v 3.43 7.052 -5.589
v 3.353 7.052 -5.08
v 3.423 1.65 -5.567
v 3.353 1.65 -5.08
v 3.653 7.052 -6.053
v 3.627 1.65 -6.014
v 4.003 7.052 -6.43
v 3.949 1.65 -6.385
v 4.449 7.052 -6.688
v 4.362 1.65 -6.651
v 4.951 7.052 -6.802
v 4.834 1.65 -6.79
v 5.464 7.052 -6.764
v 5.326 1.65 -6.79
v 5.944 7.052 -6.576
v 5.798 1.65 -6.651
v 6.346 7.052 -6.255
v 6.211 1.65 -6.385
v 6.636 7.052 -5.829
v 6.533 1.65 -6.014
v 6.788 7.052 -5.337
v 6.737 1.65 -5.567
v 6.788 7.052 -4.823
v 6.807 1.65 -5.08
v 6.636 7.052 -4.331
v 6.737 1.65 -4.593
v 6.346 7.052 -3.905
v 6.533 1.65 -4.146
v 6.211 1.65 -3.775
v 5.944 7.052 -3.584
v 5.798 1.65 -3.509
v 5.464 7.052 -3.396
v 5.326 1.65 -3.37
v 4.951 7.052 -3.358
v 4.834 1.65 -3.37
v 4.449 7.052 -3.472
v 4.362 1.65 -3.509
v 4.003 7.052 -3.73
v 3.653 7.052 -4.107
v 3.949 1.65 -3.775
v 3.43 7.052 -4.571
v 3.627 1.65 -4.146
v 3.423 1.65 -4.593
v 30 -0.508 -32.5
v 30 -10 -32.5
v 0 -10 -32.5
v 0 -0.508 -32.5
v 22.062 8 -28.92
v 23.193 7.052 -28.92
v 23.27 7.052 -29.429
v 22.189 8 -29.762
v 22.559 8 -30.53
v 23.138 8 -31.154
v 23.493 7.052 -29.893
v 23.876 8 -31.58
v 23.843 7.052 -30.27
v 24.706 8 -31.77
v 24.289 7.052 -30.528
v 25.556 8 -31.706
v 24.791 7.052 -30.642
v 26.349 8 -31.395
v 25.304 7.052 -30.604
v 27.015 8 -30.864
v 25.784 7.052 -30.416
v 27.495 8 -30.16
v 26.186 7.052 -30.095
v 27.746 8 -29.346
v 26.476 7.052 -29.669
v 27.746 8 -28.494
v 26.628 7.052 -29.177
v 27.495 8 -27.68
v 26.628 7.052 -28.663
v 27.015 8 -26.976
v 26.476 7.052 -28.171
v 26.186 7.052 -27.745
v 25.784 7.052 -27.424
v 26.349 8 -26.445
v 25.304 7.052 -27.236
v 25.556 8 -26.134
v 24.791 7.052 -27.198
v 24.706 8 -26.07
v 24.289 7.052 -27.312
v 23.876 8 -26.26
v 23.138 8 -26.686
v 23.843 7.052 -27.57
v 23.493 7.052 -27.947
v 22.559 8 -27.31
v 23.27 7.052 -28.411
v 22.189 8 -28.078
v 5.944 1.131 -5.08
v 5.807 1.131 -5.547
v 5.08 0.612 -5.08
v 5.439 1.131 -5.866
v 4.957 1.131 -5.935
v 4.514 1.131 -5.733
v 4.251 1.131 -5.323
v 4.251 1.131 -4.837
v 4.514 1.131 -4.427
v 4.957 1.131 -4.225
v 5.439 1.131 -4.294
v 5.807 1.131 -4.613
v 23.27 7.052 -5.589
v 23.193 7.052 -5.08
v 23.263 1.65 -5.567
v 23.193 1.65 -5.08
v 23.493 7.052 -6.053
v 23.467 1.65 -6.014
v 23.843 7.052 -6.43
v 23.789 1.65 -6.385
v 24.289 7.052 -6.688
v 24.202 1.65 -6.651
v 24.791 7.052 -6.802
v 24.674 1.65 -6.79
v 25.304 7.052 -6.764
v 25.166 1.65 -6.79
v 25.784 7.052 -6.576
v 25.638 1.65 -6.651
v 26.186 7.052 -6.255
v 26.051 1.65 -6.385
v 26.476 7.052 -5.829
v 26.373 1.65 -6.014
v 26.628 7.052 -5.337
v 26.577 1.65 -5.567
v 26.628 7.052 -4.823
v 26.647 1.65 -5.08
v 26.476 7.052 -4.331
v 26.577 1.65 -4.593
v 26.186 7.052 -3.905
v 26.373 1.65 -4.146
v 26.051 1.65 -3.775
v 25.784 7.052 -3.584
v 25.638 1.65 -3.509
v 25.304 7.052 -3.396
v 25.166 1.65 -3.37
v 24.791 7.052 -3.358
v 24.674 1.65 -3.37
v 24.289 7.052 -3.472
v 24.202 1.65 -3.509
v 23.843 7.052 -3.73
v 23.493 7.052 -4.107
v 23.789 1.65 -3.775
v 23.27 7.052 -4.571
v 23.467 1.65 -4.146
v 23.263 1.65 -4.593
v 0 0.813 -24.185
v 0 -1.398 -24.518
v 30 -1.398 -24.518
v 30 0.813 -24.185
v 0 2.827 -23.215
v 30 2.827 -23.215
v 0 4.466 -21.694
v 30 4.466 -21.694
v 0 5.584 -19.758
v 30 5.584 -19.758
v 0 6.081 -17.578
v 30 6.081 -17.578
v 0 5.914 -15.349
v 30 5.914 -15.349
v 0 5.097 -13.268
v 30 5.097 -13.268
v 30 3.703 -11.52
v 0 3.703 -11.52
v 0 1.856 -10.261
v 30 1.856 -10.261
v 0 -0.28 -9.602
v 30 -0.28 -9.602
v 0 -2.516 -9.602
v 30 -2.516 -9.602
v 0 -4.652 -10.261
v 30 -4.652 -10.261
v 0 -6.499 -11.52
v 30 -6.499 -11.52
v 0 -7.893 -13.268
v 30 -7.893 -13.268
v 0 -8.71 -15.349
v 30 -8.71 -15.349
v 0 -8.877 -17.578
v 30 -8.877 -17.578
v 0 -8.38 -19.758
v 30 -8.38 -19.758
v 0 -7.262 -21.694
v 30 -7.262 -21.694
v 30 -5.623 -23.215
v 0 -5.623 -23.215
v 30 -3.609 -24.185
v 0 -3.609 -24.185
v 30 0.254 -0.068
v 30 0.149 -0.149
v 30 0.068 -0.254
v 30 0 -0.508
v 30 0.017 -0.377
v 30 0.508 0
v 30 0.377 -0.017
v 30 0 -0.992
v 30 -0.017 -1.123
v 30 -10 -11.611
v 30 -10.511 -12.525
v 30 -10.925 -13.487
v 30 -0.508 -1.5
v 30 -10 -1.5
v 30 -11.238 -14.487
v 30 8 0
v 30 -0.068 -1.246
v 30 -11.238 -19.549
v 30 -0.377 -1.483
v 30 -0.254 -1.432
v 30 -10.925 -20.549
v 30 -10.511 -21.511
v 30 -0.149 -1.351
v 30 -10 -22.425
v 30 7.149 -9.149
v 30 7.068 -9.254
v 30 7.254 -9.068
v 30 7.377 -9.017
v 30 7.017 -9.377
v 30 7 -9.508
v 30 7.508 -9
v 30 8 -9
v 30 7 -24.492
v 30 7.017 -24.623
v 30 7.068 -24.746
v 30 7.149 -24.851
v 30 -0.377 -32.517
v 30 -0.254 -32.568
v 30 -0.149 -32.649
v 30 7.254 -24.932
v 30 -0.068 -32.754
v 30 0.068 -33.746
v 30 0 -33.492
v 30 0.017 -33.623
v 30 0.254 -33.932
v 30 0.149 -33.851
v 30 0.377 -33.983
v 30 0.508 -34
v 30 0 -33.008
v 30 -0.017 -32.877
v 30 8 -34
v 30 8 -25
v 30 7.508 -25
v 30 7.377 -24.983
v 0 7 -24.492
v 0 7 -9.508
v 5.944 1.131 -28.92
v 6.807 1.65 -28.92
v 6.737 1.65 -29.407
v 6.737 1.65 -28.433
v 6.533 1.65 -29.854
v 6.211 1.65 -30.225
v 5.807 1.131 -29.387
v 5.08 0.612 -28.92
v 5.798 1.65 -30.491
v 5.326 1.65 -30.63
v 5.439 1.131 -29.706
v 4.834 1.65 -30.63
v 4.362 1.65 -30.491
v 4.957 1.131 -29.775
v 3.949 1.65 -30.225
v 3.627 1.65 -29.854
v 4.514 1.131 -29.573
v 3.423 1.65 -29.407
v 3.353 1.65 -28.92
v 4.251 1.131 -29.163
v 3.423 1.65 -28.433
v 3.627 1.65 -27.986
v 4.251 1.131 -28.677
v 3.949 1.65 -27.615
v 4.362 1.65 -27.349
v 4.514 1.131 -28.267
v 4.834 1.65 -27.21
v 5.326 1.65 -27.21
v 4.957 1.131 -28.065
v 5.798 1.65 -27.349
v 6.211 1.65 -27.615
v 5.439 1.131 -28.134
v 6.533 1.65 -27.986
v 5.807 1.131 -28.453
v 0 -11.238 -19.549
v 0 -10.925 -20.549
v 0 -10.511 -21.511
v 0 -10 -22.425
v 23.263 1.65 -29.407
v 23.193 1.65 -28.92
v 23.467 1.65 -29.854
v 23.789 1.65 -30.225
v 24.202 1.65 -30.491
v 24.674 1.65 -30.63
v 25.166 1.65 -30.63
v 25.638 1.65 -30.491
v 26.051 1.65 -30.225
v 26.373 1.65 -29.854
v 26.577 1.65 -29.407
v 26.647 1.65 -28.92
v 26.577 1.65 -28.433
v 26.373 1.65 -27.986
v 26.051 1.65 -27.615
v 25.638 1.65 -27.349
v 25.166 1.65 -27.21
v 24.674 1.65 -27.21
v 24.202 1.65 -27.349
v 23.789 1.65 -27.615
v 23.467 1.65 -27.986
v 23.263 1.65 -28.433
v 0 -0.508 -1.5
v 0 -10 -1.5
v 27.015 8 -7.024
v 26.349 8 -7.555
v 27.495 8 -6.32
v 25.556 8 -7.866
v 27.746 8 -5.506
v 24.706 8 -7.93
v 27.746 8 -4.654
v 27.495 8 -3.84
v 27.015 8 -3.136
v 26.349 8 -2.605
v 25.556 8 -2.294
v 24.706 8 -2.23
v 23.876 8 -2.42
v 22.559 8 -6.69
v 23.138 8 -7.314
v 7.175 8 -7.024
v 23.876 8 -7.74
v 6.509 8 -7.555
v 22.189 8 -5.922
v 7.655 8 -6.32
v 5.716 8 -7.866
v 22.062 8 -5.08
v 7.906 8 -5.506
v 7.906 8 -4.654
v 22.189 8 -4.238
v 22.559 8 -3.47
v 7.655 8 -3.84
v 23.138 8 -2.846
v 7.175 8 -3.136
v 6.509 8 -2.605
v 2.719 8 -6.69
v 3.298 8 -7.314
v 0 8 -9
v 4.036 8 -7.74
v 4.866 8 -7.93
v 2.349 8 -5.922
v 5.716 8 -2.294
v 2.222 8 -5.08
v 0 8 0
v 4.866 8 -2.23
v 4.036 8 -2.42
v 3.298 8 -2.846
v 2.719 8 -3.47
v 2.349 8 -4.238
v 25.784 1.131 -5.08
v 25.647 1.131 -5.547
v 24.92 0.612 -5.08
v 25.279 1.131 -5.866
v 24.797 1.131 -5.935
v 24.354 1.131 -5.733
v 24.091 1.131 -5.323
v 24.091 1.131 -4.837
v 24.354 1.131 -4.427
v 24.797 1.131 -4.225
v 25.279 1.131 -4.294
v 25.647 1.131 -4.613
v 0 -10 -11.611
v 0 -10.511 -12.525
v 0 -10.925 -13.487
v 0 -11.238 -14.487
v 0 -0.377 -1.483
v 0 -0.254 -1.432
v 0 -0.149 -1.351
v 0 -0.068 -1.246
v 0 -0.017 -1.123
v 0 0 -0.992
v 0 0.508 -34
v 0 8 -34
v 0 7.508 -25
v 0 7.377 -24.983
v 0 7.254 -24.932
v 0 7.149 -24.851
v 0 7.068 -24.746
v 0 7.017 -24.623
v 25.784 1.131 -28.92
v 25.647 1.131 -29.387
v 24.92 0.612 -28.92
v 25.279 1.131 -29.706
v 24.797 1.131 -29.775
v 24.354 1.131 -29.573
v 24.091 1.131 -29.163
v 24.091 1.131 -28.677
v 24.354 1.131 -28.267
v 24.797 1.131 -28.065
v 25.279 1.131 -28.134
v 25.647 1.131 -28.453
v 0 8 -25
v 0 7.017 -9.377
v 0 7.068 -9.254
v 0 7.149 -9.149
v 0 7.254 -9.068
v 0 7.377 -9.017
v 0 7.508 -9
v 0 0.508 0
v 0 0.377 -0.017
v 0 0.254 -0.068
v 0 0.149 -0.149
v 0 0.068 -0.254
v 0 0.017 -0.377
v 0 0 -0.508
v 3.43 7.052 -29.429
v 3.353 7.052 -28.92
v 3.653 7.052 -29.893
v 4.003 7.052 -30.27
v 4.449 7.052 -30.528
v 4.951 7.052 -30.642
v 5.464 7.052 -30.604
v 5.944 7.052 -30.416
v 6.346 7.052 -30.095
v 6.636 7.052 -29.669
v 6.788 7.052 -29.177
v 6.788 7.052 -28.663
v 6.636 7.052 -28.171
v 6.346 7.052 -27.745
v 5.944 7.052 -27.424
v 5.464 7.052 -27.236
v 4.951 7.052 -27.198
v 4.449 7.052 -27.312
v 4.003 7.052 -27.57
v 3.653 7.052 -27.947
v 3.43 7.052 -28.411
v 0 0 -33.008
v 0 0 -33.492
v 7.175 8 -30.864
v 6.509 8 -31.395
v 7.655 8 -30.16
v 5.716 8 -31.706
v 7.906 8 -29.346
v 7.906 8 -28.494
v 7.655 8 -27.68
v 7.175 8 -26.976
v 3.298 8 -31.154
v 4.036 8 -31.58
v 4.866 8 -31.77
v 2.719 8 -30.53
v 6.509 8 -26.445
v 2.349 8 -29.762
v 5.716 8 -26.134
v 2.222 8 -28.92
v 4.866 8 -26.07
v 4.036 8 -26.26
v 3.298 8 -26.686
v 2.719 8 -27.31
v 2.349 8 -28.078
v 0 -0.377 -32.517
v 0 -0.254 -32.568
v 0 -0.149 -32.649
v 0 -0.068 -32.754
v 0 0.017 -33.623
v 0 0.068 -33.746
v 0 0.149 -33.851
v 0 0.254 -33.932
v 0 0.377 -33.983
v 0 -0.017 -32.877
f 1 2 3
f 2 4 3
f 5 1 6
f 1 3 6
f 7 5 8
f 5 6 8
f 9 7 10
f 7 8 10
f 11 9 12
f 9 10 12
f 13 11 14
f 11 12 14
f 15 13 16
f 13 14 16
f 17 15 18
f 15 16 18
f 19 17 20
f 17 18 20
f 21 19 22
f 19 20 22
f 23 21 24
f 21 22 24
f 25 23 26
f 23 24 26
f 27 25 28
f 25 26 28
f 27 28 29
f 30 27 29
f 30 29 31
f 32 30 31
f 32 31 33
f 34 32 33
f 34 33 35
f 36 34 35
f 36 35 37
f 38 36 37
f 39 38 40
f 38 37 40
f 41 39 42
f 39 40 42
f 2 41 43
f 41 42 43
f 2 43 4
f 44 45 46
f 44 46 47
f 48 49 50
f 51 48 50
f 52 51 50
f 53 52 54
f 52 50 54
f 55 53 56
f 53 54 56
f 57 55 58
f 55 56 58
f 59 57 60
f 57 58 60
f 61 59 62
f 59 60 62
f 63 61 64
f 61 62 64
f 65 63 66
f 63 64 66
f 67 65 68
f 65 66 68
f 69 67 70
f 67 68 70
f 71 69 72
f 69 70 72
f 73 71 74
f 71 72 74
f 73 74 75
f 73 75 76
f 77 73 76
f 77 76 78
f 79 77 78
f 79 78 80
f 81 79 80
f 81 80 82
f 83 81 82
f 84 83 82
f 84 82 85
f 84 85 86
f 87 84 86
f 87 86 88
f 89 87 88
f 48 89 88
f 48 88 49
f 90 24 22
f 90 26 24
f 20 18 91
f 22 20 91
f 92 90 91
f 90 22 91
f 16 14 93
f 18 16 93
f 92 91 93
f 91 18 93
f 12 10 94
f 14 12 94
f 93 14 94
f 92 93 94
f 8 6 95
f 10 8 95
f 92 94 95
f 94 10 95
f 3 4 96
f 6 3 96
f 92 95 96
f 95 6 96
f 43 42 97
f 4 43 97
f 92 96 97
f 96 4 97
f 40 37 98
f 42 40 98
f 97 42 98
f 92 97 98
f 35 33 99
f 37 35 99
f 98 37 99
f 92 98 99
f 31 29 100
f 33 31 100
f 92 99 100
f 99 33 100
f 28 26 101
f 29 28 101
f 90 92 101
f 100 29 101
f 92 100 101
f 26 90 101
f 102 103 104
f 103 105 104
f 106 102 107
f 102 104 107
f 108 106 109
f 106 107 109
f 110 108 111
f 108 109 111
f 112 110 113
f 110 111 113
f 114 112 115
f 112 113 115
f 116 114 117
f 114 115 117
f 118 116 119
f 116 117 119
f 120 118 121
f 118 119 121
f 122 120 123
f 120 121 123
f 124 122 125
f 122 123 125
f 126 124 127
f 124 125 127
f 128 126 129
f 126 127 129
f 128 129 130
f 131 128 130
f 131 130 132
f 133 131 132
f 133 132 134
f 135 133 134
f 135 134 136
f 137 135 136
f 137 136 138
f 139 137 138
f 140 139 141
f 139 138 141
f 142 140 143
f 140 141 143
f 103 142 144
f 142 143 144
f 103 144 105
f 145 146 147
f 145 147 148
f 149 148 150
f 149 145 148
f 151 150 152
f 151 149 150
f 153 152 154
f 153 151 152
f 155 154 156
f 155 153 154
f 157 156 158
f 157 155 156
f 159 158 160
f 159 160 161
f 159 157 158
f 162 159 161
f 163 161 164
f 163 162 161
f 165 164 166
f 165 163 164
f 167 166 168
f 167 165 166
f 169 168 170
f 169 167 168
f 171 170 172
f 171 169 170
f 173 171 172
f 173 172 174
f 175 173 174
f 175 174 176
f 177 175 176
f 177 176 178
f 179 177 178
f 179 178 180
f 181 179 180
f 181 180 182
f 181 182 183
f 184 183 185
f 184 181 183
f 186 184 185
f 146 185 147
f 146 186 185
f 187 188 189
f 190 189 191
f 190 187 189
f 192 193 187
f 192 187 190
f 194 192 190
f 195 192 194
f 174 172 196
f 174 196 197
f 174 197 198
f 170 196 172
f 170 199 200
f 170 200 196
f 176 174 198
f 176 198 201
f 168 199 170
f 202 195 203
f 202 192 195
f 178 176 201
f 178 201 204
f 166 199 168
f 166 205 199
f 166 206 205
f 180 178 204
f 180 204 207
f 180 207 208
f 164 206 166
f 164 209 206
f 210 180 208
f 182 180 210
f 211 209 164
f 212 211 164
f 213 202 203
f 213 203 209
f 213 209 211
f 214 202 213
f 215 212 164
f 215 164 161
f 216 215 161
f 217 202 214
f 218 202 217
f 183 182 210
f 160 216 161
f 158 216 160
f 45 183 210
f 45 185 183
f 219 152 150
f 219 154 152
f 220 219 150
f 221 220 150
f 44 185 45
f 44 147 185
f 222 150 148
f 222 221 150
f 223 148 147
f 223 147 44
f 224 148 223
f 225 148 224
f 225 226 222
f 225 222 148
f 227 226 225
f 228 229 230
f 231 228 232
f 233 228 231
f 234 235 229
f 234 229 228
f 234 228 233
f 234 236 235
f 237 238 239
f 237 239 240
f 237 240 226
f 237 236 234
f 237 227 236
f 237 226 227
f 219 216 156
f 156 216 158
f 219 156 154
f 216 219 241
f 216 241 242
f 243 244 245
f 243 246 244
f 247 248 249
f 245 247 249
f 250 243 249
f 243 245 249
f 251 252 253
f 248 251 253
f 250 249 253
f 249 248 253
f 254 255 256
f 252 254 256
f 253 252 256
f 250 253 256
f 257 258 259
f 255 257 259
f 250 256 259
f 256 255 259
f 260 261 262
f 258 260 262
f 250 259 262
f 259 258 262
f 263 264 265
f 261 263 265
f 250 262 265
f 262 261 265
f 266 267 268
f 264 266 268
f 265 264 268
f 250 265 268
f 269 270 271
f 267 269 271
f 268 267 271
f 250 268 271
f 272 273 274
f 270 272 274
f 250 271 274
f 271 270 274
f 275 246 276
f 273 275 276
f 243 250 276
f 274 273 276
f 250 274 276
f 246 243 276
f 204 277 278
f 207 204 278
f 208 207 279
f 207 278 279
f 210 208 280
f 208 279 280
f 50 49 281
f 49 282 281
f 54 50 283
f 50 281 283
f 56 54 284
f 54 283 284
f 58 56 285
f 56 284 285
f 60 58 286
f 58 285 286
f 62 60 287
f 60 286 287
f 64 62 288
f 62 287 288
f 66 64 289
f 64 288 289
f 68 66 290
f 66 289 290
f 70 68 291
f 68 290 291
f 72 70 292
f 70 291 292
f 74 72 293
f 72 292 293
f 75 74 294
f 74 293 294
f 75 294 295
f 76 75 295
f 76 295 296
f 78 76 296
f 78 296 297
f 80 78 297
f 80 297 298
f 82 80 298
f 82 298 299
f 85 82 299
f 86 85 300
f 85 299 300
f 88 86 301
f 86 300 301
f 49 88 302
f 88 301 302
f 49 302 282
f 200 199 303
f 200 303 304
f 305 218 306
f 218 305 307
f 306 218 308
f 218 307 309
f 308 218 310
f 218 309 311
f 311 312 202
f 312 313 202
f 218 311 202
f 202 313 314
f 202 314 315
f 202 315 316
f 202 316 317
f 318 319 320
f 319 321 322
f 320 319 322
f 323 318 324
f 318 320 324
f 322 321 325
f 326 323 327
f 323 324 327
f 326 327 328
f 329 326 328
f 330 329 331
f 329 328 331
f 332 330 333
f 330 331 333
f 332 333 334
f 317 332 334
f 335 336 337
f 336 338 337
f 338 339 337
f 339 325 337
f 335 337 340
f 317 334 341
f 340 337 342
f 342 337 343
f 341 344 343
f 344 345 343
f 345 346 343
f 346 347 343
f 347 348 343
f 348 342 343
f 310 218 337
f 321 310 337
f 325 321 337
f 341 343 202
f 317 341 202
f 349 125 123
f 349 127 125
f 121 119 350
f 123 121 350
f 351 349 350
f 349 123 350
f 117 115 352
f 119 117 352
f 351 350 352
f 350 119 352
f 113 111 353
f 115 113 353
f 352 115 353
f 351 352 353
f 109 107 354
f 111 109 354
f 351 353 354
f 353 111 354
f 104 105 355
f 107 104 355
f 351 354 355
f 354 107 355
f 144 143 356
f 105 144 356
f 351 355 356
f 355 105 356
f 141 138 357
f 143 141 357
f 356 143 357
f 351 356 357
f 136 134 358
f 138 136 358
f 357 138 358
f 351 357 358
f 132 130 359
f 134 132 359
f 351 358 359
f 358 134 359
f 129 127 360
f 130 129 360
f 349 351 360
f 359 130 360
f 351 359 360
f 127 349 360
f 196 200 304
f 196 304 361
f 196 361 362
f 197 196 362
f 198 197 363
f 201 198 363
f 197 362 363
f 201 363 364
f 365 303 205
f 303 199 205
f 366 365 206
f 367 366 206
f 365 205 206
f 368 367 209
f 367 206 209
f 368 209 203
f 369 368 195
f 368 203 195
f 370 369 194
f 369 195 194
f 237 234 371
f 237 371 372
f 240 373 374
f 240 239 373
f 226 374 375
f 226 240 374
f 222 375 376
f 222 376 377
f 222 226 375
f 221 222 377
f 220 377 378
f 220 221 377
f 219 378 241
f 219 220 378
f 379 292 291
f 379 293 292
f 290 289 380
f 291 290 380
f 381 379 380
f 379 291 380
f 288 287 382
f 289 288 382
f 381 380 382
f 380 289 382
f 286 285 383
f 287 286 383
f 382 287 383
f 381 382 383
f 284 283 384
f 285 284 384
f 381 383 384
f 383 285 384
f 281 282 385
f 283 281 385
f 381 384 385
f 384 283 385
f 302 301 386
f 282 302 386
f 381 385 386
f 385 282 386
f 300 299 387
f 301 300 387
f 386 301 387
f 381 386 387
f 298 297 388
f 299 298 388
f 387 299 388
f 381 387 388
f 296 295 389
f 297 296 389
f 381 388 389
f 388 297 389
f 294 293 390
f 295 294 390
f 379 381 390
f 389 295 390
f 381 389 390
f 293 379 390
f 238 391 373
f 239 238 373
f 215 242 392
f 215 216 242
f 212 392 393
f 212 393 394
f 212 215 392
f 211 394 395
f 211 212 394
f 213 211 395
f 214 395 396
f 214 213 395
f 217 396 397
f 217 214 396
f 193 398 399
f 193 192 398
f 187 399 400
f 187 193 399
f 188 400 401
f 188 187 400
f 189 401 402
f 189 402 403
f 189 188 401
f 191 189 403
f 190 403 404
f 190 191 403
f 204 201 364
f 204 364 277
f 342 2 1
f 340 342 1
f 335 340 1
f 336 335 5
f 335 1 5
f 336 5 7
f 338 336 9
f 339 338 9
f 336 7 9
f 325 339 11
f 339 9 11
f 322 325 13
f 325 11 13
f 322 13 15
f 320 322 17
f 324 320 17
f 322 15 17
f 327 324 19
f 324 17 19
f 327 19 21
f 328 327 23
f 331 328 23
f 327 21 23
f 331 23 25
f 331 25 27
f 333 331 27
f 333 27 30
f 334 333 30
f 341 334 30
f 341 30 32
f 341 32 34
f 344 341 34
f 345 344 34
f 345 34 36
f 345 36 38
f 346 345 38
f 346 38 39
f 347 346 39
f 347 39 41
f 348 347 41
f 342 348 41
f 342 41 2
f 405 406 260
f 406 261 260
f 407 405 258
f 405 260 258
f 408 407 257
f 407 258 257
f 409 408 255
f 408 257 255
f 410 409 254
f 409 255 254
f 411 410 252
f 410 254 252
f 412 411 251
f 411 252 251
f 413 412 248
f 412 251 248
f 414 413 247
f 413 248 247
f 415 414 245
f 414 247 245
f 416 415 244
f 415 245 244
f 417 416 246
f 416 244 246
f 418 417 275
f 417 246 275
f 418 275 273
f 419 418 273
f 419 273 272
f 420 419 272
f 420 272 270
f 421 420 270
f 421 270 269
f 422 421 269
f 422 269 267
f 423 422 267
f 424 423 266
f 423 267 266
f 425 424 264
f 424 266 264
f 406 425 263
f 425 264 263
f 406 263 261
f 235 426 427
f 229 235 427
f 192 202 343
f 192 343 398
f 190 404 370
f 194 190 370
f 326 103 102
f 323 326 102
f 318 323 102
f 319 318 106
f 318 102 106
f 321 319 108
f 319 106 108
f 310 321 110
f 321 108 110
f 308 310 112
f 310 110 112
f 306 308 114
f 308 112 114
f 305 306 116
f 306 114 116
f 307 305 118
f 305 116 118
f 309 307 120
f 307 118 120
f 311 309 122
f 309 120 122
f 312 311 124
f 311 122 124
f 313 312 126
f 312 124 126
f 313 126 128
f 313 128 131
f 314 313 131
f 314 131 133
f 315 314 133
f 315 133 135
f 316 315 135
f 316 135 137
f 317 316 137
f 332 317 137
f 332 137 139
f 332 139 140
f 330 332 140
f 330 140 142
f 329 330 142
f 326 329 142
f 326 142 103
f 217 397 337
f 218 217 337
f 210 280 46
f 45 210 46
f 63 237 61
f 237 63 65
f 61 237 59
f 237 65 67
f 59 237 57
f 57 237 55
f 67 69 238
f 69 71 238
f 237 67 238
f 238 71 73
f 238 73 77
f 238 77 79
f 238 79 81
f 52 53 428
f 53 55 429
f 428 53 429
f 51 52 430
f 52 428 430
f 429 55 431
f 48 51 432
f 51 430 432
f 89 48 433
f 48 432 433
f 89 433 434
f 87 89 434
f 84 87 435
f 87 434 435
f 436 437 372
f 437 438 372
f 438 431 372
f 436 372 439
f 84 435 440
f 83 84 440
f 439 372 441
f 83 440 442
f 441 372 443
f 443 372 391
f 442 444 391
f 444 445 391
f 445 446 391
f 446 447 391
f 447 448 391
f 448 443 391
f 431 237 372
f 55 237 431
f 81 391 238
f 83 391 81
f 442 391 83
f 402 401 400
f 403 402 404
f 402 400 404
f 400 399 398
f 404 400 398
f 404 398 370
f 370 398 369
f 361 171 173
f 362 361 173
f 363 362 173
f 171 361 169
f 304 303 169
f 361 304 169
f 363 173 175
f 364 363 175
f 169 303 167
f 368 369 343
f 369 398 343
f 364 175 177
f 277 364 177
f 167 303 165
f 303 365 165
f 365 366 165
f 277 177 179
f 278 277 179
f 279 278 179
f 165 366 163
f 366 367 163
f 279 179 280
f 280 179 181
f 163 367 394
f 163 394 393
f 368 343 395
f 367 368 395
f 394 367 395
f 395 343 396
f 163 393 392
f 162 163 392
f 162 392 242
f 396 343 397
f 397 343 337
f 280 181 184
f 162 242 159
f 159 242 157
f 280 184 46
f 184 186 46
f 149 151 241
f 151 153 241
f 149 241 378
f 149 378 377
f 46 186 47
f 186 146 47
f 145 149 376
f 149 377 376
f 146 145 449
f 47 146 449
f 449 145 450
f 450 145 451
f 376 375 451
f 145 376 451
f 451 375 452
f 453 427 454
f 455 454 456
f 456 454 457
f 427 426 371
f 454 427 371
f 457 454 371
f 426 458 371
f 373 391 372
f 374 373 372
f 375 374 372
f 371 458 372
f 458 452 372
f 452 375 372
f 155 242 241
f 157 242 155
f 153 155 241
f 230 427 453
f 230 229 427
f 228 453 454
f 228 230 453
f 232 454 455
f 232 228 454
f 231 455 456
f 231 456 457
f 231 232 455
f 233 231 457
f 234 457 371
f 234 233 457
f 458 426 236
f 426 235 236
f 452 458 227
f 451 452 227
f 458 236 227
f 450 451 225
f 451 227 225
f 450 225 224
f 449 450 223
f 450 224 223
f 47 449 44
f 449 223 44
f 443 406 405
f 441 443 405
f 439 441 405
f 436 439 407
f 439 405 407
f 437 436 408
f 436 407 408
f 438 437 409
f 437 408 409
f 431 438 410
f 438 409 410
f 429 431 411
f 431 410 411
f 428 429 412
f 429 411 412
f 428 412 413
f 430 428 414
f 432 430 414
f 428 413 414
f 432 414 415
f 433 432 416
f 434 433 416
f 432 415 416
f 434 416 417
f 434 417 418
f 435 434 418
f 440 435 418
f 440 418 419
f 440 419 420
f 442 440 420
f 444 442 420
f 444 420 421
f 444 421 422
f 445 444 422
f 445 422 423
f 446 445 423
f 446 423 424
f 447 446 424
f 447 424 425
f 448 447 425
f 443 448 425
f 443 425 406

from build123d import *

# Parameters (mm, degrees)
SKETCH1_R                                         = 7.5
BOSS_EXTRUDE1_DEPTH                               = 30
CSK_FOR_4_FLAT_HEAD_MACHINE_SCREW_100_D           = 3.4544
CSK_FOR_4_FLAT_HEAD_MACHINE_SCREW_100_DEPTH       = 6.35
CSK_FOR_4_FLAT_HEAD_MACHINE_SCREW_100_CSINK_D     = 5.715
CSK_FOR_4_FLAT_HEAD_MACHINE_SCREW_100_CSINK_ANGLE = 100
CSK_FOR_4_FLAT_HEAD_MACHINE_SCREW_100_TIP         = 1.037806461
FILLET1_R                                         = 0.508


with BuildPart() as part:
    # Sketch1 → Boss-Extrude1 (new body)
    with BuildSketch(Plane(origin=(0, 0, 0), x_dir=(0, 0, -1), z_dir=(1, 0, 0))):
        with BuildLine():
            Line((32.5, 0), (34, 0))
            Line((34, 0), (34, 7.49375))
            Line((34, 7.49375), (34, 8))
            Line((34, 8), (25, 8))
            Line((25, 8), (25, 7))
            Line((25, 7), (9, 7))
            Line((9, 7), (9, 8))
            Line((9, 8), (0, 8))
            Line((0, 8), (0, 7.49375))
            Line((0, 7.49375), (0, 0))
            Line((0, 0), (1.5, 0))
            Line((1.5, 0), (1.5, -10))
            Line((1.5, -10), (11.611411797, -10))
            ThreePointArc((11.611411797, -10), (13.001010498, -10.730169916), (14.486500092, -11.237568497))
            Line((14.486500092, -11.237568497), (19.549499908, -11.237568497))
            ThreePointArc((19.549499908, -11.237568497), (21.034989502, -10.730169916), (22.424588203, -10))
            Line((22.424588203, -10), (32.5, -10))
            Line((32.5, -10), (32.5, 0))
        make_face()
        with Locations((17.018, -1.398)):
            Circle(SKETCH1_R, mode=Mode.SUBTRACT)
    extrude(amount=BOSS_EXTRUDE1_DEPTH)

    # CSK for #4 Flat Head Machine Screw (100)1
    with Locations(Plane(origin=(0, 8, 0), x_dir=(1, 0, 0), z_dir=(0, 1, 0))):
        with Locations((5.08, 28.92), (24.92, 28.92), (24.92, 5.08), (5.08, 5.08)):
            CounterSinkHole(CSK_FOR_4_FLAT_HEAD_MACHINE_SCREW_100_D / 2, CSK_FOR_4_FLAT_HEAD_MACHINE_SCREW_100_CSINK_D / 2, depth=CSK_FOR_4_FLAT_HEAD_MACHINE_SCREW_100_DEPTH, counter_sink_angle=CSK_FOR_4_FLAT_HEAD_MACHINE_SCREW_100_CSINK_ANGLE)
            with Locations((0, 0, -(CSK_FOR_4_FLAT_HEAD_MACHINE_SCREW_100_DEPTH + CSK_FOR_4_FLAT_HEAD_MACHINE_SCREW_100_TIP / 2))):  # 118° drill point
                Cone(0, CSK_FOR_4_FLAT_HEAD_MACHINE_SCREW_100_D / 2, CSK_FOR_4_FLAT_HEAD_MACHINE_SCREW_100_TIP, mode=Mode.SUBTRACT)

    # Fillet1
    fillet1_edges = [part.edges().sort_by_distance(p)[0] for p in [
        (15, 7, -9),
        (15, 7, -25),
        (15, 0, -34),
        (15, 0, -32.5),
        (15, 0, -1.5),
        (15, 0, 0),
    ]]
    fillet(fillet1_edges, radius=FILLET1_R)


solid = part.part
